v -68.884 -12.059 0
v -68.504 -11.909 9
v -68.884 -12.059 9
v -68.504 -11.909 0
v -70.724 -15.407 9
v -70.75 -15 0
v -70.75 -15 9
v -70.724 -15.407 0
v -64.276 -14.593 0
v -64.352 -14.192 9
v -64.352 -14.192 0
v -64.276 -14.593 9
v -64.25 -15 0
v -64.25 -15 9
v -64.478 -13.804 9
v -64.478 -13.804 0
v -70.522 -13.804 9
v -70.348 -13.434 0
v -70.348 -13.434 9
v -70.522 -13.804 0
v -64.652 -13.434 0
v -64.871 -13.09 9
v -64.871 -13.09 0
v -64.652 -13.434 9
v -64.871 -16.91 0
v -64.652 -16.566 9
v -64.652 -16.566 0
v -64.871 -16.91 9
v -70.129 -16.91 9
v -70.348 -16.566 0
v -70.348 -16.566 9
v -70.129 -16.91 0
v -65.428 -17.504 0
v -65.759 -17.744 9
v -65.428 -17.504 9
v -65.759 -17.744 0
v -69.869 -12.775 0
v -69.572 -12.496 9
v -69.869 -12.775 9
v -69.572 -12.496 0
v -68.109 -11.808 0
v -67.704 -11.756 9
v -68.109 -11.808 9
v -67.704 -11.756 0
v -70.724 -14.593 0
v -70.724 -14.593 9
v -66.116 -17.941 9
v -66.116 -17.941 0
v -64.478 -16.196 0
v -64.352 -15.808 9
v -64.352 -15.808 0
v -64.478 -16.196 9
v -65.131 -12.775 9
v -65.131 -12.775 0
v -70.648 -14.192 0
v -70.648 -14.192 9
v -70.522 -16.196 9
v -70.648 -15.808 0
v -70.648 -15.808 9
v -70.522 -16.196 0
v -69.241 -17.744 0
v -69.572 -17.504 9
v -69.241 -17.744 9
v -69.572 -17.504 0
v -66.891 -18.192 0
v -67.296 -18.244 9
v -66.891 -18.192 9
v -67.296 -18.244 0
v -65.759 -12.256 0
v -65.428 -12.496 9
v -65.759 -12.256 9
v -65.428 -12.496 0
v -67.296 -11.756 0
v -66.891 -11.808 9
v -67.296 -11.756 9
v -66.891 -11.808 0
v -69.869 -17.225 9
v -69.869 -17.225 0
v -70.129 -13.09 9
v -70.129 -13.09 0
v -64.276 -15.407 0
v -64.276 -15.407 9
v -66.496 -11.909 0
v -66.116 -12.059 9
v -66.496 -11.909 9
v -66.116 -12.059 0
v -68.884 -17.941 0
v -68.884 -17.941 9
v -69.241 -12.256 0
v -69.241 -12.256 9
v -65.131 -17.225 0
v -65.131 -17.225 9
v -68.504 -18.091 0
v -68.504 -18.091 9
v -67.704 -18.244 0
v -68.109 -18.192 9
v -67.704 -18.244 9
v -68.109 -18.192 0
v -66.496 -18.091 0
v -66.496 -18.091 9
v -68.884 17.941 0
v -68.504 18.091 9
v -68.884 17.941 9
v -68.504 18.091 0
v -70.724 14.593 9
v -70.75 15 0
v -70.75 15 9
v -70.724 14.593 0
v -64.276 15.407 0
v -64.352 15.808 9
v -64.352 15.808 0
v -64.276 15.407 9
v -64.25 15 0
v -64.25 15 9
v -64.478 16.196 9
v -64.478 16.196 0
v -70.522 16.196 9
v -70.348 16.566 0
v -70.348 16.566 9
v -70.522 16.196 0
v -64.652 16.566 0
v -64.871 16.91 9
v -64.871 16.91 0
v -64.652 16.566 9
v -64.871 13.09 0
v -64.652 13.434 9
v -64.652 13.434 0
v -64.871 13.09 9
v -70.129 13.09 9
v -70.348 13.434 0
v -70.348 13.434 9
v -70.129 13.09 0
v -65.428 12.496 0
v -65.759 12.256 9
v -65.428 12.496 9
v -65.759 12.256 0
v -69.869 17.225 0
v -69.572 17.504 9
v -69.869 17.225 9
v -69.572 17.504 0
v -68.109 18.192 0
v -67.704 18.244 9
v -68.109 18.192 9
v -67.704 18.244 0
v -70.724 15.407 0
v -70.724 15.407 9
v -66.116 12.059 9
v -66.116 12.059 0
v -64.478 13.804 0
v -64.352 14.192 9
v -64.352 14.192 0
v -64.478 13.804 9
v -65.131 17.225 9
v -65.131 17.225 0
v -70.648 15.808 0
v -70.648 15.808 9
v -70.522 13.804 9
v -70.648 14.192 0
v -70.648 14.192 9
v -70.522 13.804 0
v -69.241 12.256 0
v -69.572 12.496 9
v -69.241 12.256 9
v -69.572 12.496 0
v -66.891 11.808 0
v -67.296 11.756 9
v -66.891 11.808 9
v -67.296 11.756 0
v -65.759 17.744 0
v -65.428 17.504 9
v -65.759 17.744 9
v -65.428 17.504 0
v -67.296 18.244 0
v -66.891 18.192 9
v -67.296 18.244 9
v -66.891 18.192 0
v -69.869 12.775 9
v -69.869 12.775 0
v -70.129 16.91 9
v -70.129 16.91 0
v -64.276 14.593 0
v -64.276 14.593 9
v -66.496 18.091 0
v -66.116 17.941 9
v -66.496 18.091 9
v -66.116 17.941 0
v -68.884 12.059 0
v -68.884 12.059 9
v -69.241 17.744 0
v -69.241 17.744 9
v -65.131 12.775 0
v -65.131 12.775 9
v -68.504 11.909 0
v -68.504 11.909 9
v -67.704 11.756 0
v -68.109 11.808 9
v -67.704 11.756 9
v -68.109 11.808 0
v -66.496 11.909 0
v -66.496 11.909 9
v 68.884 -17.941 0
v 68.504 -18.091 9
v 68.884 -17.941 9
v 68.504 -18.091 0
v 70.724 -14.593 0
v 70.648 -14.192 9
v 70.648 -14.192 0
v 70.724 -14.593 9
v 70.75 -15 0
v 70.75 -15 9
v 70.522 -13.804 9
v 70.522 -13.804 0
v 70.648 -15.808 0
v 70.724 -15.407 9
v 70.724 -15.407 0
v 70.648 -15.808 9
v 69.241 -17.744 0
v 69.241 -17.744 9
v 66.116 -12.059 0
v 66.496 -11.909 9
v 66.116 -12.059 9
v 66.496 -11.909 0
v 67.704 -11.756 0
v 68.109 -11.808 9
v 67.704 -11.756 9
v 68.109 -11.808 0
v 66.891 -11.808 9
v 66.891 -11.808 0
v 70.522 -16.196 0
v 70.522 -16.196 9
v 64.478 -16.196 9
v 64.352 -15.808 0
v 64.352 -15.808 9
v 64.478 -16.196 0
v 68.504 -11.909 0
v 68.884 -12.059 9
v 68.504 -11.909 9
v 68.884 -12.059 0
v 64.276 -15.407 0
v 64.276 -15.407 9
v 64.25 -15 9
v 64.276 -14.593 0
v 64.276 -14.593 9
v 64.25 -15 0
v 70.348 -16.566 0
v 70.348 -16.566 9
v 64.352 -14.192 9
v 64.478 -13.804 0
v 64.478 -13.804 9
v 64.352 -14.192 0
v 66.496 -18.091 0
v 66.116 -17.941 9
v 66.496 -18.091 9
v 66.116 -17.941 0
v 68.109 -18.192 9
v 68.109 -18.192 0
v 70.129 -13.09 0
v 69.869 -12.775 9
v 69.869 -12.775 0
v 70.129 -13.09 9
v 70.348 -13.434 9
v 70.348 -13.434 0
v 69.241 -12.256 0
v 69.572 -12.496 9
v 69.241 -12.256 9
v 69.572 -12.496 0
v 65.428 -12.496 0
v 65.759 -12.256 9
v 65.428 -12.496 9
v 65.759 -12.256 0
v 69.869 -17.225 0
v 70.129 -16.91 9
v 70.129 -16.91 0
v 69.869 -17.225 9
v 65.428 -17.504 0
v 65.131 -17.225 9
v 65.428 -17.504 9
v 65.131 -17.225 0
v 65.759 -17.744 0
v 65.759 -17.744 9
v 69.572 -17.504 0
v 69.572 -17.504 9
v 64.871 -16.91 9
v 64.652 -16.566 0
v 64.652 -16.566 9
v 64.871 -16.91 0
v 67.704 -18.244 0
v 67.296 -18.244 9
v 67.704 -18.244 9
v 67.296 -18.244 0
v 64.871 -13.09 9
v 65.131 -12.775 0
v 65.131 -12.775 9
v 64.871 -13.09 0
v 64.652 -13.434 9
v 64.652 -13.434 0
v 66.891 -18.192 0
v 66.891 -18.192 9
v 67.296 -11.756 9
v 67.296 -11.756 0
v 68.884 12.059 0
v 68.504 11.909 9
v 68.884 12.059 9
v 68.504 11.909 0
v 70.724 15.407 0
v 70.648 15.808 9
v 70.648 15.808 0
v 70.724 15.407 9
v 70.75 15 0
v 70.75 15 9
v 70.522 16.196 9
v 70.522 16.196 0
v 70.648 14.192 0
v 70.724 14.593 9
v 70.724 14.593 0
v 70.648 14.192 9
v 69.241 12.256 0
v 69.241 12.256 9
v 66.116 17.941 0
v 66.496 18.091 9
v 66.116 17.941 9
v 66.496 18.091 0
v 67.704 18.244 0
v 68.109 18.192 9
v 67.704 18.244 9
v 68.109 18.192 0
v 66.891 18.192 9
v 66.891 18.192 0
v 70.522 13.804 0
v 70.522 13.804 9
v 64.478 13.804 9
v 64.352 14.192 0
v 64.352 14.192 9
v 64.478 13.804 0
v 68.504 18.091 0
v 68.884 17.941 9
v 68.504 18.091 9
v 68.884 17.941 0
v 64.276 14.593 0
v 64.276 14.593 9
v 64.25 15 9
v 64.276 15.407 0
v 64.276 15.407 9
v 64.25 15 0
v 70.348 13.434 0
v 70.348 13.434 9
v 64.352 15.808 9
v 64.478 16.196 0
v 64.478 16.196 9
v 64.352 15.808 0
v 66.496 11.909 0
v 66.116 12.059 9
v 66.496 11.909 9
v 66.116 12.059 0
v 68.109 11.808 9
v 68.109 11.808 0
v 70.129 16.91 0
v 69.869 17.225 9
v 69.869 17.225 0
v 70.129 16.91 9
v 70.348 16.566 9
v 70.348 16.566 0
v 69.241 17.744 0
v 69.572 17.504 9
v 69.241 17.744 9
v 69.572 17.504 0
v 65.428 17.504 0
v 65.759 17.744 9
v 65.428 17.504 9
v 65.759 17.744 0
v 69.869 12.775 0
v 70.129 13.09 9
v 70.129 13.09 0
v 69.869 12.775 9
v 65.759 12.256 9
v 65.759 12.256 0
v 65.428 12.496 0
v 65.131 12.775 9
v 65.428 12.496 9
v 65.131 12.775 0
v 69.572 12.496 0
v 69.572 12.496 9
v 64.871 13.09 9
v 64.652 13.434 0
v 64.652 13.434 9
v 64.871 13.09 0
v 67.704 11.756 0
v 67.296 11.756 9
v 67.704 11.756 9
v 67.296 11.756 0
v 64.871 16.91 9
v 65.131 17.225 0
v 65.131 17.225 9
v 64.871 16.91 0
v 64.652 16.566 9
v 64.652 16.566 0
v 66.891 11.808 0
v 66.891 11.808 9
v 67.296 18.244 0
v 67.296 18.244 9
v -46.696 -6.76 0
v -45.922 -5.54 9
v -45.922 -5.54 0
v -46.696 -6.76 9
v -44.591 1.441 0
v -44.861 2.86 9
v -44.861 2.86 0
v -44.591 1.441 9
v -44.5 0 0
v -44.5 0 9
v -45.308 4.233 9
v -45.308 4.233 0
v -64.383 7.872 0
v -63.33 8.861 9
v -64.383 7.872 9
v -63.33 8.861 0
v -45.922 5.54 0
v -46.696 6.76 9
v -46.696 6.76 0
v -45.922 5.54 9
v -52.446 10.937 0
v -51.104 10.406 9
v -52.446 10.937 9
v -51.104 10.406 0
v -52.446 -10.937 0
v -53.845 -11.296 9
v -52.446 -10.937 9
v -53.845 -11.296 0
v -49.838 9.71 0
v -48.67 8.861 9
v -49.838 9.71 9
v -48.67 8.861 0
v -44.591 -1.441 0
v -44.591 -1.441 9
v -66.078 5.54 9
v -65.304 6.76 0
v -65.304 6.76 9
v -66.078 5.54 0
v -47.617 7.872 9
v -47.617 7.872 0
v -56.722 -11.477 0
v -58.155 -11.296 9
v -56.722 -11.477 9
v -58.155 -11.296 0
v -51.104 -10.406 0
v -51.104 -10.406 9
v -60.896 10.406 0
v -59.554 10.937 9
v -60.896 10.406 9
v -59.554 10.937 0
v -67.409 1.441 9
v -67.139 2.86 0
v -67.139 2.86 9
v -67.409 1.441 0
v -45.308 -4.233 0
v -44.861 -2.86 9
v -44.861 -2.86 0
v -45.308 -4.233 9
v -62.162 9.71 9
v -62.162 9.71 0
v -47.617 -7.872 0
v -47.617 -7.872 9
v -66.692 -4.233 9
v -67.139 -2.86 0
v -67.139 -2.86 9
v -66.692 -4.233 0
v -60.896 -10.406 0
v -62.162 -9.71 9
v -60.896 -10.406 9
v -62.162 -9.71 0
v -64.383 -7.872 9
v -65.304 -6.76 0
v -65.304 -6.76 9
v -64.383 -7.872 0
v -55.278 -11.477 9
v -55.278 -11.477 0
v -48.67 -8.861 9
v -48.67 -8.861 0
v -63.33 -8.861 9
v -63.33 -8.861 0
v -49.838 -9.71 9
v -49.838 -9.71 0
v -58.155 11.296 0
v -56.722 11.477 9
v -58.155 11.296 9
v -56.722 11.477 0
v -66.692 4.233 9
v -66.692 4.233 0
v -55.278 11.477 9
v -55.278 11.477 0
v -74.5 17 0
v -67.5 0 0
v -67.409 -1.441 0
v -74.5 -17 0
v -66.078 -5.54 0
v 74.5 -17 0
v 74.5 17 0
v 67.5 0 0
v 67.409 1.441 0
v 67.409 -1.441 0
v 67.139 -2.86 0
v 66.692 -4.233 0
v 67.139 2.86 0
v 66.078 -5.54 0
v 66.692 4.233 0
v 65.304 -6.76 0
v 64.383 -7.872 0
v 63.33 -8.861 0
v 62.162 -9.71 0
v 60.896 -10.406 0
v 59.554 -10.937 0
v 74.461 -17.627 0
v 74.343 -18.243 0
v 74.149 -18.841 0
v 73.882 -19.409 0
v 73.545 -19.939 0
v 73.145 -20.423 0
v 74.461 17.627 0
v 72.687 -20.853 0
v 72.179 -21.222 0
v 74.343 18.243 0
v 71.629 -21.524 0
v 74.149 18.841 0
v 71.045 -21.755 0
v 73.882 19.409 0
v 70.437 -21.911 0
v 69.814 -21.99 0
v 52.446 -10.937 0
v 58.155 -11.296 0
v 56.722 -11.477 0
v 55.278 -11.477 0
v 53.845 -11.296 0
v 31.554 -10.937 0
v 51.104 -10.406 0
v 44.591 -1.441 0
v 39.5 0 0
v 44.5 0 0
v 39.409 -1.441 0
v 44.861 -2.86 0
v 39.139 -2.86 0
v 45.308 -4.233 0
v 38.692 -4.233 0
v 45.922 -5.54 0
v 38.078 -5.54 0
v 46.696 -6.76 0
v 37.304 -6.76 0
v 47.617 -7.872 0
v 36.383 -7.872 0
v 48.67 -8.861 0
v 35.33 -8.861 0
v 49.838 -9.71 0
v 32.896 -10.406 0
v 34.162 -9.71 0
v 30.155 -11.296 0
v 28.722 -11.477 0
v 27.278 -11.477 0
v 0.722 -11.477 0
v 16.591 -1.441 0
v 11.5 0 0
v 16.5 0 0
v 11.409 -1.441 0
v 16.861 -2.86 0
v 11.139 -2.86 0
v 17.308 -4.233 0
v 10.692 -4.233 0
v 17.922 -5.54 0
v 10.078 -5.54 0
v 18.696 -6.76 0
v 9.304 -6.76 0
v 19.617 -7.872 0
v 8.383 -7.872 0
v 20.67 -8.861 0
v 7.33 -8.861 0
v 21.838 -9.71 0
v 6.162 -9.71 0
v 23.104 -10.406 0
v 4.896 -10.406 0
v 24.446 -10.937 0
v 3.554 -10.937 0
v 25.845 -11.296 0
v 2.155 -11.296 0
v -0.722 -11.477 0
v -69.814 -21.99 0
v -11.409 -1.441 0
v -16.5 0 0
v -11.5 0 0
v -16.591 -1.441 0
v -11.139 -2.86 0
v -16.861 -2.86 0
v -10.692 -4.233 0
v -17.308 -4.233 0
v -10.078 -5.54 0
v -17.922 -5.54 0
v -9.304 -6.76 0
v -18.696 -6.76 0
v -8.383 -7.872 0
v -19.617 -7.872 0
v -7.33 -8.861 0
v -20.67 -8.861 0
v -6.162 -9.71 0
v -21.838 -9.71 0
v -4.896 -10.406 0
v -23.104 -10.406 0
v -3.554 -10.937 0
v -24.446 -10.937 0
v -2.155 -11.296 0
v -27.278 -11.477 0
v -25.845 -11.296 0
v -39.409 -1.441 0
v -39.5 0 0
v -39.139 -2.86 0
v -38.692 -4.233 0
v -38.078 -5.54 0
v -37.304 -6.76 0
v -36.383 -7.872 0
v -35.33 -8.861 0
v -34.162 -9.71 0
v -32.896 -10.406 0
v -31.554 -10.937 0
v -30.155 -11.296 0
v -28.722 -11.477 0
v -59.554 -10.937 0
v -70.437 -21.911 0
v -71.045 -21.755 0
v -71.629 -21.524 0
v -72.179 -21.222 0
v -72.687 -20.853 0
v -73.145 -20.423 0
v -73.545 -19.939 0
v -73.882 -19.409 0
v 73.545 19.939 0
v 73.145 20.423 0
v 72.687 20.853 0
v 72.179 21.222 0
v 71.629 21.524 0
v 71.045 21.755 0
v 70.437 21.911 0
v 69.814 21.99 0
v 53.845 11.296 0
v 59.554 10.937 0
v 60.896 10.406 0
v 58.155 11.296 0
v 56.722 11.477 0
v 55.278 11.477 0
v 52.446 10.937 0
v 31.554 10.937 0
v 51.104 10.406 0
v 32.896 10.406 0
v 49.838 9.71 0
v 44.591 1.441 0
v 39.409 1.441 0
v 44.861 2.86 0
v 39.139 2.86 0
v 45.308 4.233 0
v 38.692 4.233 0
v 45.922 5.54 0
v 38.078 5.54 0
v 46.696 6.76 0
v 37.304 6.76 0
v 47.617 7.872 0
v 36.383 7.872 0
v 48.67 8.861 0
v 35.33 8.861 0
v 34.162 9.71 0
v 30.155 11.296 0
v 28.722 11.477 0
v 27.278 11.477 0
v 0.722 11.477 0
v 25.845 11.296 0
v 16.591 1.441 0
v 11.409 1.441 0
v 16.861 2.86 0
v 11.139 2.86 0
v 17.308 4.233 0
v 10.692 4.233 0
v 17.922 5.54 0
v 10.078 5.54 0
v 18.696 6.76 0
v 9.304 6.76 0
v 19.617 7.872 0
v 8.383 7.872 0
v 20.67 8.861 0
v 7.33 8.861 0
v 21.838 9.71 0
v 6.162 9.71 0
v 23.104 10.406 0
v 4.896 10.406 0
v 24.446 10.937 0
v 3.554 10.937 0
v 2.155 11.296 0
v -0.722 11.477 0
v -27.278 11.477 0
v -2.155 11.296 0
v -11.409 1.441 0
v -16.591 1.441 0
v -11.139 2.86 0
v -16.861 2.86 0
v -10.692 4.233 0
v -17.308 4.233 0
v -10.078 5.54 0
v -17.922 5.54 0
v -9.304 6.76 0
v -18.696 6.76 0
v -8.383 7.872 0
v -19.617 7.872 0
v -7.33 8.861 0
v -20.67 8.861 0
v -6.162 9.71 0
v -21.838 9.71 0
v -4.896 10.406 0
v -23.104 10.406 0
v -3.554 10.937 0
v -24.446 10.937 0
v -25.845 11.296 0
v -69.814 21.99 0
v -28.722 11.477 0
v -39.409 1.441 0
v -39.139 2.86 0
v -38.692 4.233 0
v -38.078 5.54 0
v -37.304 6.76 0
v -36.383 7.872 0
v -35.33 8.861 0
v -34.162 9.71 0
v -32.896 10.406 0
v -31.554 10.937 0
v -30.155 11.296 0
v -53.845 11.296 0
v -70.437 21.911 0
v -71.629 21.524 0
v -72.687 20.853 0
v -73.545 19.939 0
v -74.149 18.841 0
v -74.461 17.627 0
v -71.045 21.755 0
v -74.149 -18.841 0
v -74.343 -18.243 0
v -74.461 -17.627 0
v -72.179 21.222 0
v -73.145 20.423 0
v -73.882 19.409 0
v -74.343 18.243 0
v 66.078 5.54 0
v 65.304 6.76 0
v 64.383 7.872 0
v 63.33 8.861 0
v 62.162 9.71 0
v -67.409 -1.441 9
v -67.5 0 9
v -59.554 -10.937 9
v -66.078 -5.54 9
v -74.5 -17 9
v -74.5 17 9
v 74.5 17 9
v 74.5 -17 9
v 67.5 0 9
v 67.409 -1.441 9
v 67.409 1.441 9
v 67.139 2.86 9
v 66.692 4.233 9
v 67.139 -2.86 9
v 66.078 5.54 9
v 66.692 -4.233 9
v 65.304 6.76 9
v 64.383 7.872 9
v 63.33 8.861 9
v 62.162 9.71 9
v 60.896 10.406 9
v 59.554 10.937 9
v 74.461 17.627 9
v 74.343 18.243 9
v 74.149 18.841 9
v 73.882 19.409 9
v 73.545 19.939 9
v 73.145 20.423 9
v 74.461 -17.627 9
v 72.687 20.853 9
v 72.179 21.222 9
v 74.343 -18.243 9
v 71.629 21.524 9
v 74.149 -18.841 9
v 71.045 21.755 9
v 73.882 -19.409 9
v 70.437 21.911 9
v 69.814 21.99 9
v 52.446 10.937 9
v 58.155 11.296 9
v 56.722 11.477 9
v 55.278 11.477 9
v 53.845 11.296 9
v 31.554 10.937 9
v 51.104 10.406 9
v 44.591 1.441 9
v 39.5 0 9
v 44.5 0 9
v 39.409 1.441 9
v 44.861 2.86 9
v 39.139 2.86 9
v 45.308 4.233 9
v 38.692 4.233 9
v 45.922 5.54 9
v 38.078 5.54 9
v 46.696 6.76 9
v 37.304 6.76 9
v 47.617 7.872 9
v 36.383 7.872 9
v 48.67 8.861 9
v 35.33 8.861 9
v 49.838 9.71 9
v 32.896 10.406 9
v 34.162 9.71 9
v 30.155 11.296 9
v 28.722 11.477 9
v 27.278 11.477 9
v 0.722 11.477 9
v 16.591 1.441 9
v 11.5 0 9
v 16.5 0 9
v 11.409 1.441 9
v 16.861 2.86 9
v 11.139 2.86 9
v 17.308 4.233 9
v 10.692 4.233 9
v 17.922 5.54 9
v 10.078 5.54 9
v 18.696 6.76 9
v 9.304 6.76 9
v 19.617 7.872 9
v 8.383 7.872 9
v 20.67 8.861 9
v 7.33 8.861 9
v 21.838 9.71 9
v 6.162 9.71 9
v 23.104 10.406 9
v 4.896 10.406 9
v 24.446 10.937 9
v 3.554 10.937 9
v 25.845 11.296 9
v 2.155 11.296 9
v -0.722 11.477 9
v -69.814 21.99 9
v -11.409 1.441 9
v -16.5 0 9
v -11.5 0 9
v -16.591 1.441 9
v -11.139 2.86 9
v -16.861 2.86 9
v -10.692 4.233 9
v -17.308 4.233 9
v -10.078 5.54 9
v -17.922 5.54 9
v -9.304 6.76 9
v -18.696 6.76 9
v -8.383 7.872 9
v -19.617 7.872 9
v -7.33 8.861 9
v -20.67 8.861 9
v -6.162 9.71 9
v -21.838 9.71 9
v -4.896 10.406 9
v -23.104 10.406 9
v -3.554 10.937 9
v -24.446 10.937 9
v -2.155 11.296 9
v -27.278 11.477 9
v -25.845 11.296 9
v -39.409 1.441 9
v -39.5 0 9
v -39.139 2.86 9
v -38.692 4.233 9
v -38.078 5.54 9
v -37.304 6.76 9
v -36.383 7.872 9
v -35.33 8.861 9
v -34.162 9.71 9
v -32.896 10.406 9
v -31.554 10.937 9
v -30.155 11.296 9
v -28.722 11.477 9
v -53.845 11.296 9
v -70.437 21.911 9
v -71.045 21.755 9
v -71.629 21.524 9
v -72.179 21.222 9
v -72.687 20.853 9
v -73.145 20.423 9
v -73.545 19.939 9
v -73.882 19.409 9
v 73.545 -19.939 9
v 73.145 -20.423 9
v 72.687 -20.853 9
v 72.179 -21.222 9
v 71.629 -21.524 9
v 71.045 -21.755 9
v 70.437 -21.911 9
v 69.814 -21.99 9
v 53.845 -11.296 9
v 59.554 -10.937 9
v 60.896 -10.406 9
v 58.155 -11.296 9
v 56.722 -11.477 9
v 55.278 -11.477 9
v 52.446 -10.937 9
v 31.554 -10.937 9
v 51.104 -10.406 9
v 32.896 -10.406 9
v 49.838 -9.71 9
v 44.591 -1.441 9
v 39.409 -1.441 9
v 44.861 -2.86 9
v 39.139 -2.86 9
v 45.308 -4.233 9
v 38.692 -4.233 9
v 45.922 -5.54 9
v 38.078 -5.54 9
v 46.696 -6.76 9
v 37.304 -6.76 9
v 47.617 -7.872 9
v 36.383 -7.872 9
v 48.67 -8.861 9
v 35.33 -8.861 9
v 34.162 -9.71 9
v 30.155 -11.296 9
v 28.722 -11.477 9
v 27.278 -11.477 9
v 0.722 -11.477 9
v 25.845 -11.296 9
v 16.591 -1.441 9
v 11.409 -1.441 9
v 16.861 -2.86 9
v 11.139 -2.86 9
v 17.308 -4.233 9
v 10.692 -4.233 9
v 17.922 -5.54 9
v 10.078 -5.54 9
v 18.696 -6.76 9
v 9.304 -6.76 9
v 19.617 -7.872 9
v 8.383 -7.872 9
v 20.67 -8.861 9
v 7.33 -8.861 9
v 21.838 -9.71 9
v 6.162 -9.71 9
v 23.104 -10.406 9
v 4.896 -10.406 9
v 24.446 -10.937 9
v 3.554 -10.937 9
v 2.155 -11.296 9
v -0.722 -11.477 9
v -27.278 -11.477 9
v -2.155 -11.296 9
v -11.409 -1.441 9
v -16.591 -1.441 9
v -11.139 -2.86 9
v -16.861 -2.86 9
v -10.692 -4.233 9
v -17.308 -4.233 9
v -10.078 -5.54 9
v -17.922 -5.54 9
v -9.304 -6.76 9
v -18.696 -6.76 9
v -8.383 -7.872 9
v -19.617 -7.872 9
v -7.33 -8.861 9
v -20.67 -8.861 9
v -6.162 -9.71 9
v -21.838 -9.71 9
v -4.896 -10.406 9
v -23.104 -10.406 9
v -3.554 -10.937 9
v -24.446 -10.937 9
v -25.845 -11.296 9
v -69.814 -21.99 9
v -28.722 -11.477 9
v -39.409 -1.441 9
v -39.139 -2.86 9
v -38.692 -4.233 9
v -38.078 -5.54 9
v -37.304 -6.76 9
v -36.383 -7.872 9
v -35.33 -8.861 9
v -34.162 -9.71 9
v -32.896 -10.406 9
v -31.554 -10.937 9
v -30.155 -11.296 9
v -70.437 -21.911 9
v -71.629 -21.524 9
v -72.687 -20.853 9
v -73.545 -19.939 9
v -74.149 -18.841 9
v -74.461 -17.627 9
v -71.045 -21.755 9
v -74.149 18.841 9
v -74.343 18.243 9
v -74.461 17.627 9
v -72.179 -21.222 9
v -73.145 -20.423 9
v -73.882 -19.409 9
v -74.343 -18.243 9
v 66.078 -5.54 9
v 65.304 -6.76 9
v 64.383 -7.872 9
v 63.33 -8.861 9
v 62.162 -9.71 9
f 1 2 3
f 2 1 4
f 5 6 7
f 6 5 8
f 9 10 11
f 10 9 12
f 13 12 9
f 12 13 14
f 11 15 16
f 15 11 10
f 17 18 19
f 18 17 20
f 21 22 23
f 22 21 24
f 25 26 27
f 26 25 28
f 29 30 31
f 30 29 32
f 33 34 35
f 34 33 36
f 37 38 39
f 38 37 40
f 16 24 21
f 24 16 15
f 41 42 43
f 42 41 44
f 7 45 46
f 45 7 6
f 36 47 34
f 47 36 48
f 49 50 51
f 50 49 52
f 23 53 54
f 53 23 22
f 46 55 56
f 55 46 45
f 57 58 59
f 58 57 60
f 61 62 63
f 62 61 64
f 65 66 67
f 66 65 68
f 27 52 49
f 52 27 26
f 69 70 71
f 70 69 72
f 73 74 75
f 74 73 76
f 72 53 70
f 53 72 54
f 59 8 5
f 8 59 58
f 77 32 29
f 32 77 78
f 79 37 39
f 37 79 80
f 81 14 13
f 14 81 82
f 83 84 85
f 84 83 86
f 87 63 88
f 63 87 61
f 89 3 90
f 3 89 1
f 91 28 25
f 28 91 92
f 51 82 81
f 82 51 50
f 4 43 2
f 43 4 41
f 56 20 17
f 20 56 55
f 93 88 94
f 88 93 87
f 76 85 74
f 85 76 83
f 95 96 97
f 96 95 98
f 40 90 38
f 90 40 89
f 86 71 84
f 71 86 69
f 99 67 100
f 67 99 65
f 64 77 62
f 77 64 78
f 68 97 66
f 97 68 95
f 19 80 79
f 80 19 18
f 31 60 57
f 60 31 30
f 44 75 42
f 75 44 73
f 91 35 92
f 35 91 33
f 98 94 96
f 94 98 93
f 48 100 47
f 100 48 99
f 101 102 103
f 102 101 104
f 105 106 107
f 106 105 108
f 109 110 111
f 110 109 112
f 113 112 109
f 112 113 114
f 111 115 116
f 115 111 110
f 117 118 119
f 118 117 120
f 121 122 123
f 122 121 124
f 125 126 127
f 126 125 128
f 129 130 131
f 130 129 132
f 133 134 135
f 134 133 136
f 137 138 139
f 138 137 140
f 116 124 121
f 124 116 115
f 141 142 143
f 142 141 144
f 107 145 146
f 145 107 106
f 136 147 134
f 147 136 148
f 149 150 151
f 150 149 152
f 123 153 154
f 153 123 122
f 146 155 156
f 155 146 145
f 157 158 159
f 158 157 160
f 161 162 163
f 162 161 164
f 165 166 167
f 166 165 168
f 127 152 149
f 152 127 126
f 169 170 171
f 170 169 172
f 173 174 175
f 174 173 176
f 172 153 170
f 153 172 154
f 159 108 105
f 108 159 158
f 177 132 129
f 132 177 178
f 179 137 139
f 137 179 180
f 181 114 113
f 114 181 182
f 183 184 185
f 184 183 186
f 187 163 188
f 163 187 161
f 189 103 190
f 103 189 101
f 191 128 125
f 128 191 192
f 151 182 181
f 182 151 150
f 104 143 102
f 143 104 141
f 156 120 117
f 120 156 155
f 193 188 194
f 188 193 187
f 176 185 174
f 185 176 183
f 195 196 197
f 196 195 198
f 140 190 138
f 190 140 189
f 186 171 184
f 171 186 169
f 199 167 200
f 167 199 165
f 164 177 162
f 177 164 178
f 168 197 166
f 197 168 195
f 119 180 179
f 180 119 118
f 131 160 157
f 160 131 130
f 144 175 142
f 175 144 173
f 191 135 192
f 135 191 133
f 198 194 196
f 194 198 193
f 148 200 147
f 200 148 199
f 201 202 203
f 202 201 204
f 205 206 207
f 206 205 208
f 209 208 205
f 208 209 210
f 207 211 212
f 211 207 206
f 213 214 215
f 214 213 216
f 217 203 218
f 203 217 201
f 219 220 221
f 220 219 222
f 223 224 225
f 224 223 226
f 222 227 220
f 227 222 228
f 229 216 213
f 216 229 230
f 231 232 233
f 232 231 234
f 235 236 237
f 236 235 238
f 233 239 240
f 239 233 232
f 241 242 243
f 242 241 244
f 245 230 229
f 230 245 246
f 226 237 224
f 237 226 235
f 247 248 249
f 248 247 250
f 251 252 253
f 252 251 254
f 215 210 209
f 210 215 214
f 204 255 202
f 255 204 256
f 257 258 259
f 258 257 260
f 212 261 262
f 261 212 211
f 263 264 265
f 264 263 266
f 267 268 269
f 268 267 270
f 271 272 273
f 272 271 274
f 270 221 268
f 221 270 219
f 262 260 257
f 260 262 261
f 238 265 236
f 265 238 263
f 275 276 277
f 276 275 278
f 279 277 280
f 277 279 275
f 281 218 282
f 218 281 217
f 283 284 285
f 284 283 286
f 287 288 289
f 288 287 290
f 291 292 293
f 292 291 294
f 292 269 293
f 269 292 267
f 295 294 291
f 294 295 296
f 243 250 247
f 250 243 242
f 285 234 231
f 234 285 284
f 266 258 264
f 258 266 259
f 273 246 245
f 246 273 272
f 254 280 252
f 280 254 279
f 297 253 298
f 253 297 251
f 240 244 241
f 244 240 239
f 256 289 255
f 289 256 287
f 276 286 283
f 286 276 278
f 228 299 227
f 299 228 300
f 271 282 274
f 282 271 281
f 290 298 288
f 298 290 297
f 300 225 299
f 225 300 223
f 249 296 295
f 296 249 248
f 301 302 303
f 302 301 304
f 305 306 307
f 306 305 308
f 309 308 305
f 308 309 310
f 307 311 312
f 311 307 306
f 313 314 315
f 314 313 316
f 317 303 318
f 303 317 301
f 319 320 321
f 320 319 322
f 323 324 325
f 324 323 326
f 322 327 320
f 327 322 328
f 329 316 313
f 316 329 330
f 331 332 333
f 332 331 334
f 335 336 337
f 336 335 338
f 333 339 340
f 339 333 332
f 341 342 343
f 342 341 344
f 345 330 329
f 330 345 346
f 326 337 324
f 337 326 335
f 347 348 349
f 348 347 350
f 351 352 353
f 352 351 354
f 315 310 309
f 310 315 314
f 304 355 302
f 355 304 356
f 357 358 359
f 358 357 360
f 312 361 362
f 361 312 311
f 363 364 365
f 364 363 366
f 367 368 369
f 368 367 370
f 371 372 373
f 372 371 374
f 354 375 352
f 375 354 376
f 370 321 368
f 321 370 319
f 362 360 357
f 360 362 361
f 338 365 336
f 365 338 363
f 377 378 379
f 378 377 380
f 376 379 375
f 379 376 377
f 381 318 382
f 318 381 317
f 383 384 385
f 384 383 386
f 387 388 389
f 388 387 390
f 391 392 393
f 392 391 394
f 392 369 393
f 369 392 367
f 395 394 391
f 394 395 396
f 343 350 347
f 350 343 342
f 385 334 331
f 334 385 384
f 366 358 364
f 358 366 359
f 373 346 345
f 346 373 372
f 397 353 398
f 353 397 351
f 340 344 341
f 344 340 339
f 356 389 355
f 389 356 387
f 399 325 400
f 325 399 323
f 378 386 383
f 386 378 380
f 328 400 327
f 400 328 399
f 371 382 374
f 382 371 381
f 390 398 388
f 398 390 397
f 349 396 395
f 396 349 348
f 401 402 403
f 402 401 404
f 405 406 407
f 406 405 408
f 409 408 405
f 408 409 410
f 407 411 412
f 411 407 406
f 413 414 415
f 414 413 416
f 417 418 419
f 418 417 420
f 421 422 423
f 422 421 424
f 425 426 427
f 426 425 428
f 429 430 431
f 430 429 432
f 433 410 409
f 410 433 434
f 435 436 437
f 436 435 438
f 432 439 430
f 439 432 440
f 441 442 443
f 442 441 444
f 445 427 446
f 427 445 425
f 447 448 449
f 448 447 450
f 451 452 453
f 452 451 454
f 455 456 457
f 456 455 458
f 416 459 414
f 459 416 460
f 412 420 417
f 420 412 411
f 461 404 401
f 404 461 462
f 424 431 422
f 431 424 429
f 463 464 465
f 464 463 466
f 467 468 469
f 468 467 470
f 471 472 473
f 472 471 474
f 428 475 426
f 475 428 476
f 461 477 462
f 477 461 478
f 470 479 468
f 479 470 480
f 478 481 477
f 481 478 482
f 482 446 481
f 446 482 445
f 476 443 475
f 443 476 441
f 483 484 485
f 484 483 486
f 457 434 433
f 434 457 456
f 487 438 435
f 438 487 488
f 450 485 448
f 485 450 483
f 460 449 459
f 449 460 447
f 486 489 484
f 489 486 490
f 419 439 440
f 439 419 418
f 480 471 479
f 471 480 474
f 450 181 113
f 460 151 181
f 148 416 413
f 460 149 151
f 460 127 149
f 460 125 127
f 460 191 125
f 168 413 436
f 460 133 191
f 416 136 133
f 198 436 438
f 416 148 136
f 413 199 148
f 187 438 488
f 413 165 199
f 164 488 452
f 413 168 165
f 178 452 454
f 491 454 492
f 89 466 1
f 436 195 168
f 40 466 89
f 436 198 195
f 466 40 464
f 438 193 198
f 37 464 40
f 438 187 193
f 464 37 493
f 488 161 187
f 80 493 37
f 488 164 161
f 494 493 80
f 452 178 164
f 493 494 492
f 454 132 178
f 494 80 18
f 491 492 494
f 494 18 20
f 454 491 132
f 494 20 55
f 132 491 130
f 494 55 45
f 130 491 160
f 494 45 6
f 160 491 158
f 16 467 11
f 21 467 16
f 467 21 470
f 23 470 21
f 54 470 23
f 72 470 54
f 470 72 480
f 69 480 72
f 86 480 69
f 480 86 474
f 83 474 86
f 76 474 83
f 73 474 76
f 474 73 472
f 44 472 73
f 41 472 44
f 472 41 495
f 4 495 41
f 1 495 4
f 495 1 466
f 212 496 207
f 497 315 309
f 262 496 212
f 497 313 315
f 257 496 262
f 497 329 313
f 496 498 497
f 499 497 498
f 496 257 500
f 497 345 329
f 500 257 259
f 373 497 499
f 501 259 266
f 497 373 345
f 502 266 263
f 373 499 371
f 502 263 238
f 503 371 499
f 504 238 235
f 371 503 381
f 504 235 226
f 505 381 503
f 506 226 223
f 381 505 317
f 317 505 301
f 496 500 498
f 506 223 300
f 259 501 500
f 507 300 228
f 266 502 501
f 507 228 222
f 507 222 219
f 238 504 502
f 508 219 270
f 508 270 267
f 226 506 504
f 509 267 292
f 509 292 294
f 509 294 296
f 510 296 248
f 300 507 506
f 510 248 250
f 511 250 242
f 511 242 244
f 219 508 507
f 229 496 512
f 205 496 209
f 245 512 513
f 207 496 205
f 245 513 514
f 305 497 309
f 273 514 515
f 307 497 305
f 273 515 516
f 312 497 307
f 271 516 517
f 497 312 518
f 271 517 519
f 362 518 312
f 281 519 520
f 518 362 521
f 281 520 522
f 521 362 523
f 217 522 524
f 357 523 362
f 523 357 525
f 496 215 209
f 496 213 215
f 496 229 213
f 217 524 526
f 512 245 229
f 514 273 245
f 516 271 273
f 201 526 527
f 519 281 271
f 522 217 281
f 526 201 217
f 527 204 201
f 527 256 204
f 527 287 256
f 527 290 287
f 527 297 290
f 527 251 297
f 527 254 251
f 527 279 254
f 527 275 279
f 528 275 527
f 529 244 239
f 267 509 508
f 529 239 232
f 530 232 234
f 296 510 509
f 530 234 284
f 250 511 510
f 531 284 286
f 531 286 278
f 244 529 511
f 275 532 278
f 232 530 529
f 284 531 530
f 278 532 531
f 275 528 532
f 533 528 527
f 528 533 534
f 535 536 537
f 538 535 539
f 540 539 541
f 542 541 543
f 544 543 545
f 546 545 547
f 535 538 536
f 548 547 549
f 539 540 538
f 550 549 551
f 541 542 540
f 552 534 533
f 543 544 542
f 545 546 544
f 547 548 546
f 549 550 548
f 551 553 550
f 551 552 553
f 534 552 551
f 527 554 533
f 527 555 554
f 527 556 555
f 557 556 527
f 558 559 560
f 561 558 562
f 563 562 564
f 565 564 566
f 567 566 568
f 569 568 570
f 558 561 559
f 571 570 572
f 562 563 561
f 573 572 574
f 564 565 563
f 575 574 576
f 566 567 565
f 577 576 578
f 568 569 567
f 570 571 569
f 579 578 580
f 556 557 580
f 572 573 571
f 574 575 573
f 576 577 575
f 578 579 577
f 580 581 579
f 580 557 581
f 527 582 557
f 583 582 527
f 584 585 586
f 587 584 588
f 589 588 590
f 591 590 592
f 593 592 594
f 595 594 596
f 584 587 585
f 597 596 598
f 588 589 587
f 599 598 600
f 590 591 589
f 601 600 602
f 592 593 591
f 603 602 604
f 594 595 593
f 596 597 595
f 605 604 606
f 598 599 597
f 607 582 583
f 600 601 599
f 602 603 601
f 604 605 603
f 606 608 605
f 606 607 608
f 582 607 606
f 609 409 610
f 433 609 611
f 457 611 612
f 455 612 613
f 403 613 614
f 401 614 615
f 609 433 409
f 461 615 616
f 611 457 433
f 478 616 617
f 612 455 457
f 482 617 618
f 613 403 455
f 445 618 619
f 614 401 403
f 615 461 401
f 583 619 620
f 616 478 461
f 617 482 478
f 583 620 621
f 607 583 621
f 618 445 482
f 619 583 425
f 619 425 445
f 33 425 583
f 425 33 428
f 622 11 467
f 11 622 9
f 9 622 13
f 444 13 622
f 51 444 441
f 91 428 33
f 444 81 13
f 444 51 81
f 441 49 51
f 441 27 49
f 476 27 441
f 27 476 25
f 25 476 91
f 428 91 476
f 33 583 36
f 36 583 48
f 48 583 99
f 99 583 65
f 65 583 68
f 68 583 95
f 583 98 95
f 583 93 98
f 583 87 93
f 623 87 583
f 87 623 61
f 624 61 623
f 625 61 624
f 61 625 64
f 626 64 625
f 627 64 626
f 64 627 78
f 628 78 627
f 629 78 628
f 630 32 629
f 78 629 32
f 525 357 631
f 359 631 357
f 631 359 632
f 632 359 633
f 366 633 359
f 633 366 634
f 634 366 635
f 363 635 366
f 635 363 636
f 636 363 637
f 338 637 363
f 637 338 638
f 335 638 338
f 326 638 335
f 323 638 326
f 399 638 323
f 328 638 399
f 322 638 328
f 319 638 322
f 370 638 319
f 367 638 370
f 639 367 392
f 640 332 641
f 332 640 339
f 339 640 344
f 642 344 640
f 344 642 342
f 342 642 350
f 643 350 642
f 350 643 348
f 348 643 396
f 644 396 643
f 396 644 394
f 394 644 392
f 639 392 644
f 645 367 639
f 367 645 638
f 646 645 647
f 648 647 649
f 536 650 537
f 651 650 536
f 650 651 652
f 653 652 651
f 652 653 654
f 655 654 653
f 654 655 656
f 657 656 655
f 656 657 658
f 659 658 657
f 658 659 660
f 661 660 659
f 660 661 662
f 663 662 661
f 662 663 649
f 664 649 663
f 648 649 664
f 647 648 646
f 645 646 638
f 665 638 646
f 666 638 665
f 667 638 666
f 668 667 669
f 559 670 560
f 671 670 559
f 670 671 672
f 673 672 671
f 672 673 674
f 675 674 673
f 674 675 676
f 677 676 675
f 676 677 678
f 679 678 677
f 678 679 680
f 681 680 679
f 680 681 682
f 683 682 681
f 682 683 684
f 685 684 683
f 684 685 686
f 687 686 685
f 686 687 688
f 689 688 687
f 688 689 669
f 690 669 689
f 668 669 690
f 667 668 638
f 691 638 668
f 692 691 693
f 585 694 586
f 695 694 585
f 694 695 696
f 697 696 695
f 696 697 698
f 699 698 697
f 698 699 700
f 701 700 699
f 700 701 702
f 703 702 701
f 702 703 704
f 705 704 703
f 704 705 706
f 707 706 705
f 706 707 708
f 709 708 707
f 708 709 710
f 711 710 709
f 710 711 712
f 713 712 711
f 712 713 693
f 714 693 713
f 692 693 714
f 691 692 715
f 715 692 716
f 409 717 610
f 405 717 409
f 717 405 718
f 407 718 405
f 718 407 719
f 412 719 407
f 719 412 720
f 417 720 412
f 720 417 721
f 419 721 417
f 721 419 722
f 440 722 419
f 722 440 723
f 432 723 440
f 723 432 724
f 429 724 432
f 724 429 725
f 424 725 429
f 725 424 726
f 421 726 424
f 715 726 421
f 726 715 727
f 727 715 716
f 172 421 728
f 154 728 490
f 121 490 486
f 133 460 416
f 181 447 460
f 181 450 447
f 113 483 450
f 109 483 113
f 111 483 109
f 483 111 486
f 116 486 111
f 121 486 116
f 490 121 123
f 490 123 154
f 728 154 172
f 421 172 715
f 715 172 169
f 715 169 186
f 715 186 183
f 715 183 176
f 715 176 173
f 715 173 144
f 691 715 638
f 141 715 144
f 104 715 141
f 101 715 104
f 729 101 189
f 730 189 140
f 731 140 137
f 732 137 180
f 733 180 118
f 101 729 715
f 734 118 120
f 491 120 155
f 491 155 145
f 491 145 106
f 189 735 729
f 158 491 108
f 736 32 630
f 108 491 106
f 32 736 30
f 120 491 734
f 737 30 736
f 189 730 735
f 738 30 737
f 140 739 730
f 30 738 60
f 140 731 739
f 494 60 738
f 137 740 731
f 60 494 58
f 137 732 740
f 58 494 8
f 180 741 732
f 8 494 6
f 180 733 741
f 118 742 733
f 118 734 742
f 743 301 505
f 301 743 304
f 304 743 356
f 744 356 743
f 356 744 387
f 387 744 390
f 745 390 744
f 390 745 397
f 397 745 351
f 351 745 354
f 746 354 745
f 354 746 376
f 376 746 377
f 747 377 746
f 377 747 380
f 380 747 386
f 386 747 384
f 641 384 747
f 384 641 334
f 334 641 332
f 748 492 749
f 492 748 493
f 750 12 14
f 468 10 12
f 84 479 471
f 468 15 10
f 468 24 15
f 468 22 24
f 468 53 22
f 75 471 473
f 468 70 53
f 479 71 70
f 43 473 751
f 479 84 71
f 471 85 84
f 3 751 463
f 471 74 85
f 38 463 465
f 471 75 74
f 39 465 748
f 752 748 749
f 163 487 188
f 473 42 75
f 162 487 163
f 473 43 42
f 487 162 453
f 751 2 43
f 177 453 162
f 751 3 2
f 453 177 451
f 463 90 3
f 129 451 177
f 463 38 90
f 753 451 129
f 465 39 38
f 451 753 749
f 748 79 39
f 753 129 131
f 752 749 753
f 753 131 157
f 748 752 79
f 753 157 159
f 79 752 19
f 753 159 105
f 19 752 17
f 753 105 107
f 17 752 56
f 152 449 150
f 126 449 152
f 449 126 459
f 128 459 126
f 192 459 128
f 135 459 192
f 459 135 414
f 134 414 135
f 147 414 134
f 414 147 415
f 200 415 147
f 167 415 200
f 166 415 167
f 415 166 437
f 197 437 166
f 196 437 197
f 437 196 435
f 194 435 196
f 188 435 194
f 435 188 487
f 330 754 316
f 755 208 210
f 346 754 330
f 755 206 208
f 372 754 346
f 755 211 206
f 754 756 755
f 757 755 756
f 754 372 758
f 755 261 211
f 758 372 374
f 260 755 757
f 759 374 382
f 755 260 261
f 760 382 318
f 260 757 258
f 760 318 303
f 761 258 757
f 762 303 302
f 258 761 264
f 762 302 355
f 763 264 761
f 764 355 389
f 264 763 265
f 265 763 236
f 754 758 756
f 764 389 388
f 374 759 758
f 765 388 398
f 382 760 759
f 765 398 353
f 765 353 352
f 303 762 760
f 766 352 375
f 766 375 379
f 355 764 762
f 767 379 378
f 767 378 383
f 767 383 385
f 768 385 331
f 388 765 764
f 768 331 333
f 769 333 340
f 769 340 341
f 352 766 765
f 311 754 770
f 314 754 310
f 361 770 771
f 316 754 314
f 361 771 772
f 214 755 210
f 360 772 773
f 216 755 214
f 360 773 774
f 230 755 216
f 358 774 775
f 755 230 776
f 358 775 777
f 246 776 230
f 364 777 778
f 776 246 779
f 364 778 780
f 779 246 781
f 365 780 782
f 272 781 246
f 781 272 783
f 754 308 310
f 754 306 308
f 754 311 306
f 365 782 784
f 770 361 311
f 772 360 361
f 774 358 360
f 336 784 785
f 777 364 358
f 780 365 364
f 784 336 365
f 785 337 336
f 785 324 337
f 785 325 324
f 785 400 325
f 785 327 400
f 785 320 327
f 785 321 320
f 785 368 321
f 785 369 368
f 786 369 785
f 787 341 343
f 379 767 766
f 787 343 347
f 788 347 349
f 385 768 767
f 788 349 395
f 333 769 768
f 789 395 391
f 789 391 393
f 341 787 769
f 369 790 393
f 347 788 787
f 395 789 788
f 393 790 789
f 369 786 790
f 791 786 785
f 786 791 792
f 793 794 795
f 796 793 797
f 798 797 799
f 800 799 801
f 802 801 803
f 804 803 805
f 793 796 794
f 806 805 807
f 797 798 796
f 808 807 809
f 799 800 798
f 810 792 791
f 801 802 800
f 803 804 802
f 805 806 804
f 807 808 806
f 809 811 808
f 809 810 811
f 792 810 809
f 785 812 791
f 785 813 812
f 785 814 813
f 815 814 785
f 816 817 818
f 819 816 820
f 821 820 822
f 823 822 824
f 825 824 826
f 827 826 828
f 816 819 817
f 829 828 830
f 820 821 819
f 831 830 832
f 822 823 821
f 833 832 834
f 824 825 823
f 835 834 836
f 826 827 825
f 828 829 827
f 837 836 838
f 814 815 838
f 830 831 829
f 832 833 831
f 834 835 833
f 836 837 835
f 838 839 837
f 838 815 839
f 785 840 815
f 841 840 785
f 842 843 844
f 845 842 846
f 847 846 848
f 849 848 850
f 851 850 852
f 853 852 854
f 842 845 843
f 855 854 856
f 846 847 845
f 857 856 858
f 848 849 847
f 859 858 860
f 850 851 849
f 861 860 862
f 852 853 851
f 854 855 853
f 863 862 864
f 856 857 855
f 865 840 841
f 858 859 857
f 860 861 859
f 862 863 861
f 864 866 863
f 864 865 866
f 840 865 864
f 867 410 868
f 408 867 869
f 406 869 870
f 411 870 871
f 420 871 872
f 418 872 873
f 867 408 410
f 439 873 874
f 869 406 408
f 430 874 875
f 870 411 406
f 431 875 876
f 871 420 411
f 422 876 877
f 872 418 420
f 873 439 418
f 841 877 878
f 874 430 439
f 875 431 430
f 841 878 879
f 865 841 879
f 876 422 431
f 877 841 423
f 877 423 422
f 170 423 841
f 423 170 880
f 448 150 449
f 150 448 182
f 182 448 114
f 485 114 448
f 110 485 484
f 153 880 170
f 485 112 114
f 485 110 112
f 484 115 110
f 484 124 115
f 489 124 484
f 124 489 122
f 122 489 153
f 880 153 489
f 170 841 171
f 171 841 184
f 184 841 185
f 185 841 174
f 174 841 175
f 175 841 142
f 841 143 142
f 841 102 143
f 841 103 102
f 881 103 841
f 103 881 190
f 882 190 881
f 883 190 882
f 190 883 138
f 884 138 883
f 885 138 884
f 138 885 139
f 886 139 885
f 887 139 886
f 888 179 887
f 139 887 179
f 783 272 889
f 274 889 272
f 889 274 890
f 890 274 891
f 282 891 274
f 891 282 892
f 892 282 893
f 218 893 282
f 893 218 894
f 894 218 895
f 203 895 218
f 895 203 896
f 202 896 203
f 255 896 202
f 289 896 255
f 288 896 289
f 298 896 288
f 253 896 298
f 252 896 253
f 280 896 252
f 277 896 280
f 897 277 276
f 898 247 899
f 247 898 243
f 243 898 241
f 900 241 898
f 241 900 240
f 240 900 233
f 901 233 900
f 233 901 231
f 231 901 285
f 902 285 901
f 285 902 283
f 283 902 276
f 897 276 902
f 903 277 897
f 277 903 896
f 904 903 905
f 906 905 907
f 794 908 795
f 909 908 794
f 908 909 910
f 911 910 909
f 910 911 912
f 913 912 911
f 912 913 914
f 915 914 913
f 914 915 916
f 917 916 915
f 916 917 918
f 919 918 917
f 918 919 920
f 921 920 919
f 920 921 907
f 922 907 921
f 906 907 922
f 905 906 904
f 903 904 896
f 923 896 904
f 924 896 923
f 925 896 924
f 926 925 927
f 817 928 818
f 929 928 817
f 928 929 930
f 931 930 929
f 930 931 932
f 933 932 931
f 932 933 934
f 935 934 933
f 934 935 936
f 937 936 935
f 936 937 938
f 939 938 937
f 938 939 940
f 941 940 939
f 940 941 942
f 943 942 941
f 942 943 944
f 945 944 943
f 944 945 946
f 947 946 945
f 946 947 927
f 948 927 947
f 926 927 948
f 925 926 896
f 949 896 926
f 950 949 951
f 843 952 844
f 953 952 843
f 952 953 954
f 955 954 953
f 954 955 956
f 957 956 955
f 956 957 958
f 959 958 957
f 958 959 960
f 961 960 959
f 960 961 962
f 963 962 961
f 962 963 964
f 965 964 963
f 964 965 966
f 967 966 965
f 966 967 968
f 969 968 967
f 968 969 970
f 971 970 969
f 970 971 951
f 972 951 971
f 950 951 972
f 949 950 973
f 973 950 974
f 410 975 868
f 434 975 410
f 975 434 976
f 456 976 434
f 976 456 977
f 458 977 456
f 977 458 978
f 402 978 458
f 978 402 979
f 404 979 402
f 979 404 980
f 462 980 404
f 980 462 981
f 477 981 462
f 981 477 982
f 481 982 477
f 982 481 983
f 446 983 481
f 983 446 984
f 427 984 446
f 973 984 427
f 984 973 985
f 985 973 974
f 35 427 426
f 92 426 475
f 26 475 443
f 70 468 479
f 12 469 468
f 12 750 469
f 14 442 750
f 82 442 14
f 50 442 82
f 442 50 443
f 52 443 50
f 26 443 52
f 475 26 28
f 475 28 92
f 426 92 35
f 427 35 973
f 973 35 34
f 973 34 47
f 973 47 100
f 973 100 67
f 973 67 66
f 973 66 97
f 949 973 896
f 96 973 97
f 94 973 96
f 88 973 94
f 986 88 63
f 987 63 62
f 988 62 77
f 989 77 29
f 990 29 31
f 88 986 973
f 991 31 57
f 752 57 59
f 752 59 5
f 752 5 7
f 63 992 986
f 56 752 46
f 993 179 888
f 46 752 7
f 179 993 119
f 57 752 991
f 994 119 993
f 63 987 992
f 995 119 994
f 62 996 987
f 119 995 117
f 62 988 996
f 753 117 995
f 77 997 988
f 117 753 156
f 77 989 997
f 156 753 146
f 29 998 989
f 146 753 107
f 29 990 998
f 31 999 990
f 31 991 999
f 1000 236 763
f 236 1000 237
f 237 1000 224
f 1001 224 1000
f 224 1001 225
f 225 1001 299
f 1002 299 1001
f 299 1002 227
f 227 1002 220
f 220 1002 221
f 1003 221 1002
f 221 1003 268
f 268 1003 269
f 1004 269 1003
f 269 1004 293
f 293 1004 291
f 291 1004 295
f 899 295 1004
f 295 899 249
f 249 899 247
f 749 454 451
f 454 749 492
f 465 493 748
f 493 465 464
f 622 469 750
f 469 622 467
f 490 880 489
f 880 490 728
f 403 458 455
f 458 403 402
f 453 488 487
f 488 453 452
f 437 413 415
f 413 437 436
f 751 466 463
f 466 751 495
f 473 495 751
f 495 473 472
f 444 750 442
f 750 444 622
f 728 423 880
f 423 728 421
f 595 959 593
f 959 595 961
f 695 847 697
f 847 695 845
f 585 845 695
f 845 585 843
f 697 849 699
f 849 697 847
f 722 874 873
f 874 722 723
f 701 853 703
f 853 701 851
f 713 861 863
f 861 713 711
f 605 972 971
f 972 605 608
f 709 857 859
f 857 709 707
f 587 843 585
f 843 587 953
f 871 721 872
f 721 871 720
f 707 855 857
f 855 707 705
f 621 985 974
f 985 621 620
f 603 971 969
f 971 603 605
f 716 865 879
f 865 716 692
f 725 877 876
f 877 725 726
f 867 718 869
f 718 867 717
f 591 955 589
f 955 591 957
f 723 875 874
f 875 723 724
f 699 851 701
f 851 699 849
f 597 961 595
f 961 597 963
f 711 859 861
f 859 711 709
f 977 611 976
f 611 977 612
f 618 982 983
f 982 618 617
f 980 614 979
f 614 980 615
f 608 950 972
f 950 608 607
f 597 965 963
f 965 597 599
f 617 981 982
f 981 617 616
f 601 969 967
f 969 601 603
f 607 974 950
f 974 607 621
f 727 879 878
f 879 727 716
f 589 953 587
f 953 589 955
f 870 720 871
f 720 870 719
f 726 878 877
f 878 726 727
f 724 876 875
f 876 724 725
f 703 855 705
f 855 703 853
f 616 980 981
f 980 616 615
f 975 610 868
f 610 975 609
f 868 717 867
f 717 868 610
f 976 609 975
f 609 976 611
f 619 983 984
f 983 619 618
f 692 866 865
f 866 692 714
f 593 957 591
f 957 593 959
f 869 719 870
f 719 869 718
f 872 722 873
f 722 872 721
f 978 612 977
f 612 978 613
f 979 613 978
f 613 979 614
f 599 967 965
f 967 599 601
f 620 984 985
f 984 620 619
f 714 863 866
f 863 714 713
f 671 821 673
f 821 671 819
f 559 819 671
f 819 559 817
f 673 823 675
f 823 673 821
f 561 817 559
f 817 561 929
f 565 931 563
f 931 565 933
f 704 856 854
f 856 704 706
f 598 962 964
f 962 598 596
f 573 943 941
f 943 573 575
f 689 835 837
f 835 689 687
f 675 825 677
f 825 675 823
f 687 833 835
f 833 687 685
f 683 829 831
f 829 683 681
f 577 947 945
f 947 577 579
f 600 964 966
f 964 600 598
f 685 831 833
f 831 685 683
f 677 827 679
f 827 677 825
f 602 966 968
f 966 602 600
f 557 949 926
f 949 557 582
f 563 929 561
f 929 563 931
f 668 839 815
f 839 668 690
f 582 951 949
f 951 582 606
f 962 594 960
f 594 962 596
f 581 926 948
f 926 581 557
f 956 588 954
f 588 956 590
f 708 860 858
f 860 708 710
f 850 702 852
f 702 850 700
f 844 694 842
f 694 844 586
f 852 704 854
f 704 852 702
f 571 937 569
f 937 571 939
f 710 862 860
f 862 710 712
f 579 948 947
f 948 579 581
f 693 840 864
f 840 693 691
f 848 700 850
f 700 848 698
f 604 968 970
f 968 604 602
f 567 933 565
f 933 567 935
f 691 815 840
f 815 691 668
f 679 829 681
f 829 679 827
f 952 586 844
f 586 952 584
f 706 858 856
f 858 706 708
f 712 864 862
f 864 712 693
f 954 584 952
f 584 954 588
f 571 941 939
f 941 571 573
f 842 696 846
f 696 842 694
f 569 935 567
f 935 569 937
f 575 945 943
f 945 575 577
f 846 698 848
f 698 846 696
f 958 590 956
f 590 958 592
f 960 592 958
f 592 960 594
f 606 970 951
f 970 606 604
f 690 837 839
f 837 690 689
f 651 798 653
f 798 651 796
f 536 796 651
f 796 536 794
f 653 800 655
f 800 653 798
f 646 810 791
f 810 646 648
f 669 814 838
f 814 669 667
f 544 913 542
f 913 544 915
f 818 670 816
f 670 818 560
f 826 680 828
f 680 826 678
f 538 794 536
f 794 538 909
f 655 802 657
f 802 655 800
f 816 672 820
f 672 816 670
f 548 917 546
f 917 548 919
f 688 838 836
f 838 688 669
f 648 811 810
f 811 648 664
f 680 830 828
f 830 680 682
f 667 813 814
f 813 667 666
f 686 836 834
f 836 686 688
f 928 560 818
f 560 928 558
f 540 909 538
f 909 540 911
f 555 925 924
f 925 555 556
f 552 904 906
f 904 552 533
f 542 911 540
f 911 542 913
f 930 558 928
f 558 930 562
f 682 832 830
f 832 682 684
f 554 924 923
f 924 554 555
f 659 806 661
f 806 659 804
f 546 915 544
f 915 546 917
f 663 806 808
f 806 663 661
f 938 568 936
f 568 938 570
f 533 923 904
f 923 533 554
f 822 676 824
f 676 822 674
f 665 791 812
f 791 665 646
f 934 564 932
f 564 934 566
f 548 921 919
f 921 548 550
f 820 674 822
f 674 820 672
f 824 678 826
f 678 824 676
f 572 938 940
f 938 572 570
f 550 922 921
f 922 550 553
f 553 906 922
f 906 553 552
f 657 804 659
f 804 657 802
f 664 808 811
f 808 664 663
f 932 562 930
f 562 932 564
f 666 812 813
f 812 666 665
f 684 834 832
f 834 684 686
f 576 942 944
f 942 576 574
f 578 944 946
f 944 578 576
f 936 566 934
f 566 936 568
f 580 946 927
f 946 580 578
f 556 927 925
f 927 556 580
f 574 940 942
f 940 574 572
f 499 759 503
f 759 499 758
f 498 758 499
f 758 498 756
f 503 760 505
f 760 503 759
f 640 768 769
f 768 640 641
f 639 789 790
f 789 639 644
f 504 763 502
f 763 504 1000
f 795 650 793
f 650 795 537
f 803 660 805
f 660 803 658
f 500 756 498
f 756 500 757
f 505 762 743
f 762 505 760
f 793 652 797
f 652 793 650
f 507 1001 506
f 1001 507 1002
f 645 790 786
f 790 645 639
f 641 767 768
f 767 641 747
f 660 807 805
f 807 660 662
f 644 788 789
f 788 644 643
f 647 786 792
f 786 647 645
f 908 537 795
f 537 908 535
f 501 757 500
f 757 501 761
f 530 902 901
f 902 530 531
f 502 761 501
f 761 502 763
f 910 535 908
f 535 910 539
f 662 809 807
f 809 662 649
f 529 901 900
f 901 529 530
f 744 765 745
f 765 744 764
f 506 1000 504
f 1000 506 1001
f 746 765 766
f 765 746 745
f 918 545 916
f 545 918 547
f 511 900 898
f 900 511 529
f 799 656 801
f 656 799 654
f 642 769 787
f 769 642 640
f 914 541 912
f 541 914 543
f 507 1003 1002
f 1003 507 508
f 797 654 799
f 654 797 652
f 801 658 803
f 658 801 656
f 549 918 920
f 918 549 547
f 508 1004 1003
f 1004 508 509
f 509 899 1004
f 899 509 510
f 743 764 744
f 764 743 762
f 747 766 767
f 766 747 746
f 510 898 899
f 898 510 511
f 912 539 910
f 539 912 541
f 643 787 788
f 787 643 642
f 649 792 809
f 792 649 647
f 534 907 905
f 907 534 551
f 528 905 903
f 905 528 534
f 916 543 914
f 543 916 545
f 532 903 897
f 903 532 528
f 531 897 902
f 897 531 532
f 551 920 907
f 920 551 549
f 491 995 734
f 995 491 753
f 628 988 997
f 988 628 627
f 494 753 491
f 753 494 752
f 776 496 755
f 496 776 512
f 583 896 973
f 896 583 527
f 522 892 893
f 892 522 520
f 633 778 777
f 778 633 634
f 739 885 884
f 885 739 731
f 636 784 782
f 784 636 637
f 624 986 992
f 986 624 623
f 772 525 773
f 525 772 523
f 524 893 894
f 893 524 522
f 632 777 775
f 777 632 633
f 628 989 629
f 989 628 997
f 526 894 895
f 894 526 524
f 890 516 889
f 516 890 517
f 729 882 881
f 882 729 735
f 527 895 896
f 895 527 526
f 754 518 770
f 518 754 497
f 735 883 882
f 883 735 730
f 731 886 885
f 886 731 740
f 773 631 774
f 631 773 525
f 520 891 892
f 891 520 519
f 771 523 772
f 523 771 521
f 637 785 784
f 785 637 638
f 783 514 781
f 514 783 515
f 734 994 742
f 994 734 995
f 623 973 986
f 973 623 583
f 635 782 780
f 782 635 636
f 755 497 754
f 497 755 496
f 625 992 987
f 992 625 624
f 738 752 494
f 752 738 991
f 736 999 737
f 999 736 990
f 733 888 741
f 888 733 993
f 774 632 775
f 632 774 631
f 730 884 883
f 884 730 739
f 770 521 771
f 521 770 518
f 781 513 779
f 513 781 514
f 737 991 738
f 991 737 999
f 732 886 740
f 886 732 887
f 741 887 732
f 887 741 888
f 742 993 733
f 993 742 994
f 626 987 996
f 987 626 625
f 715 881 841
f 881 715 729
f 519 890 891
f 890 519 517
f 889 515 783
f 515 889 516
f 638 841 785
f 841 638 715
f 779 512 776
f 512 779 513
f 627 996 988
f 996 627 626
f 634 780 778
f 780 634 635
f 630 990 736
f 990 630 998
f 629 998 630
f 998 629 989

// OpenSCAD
$fn = 50;


difference() {
	union() {
		hull() {
			translate(v = [-69.5000000000, 17.0000000000, 0]) {
				cylinder(h = 9, r = 5);
			}
			translate(v = [69.5000000000, 17.0000000000, 0]) {
				cylinder(h = 9, r = 5);
			}
			translate(v = [-69.5000000000, -17.0000000000, 0]) {
				cylinder(h = 9, r = 5);
			}
			translate(v = [69.5000000000, -17.0000000000, 0]) {
				cylinder(h = 9, r = 5);
			}
		}
	}
	union() {
		#translate(v = [-67.5000000000, -15.0000000000, -100.0000000000]) {
			cylinder(h = 200, r = 3.2500000000);
		}
		#translate(v = [-67.5000000000, 15.0000000000, -100.0000000000]) {
			cylinder(h = 200, r = 3.2500000000);
		}
		#translate(v = [67.5000000000, -15.0000000000, -100.0000000000]) {
			cylinder(h = 200, r = 3.2500000000);
		}
		#translate(v = [67.5000000000, 15.0000000000, -100.0000000000]) {
			cylinder(h = 200, r = 3.2500000000);
		}
		#translate(v = [-56.0000000000, 0, 0]) {
			cylinder(h = 9, r = 11.5000000000);
		}
		#translate(v = [-28.0000000000, 0, 0]) {
			cylinder(h = 9, r = 11.5000000000);
		}
		#cylinder(h = 9, r = 11.5000000000);
		#translate(v = [28.0000000000, 0, 0]) {
			cylinder(h = 9, r = 11.5000000000);
		}
		#translate(v = [56.0000000000, 0, 0]) {
			cylinder(h = 9, r = 11.5000000000);
		}
	}
}
